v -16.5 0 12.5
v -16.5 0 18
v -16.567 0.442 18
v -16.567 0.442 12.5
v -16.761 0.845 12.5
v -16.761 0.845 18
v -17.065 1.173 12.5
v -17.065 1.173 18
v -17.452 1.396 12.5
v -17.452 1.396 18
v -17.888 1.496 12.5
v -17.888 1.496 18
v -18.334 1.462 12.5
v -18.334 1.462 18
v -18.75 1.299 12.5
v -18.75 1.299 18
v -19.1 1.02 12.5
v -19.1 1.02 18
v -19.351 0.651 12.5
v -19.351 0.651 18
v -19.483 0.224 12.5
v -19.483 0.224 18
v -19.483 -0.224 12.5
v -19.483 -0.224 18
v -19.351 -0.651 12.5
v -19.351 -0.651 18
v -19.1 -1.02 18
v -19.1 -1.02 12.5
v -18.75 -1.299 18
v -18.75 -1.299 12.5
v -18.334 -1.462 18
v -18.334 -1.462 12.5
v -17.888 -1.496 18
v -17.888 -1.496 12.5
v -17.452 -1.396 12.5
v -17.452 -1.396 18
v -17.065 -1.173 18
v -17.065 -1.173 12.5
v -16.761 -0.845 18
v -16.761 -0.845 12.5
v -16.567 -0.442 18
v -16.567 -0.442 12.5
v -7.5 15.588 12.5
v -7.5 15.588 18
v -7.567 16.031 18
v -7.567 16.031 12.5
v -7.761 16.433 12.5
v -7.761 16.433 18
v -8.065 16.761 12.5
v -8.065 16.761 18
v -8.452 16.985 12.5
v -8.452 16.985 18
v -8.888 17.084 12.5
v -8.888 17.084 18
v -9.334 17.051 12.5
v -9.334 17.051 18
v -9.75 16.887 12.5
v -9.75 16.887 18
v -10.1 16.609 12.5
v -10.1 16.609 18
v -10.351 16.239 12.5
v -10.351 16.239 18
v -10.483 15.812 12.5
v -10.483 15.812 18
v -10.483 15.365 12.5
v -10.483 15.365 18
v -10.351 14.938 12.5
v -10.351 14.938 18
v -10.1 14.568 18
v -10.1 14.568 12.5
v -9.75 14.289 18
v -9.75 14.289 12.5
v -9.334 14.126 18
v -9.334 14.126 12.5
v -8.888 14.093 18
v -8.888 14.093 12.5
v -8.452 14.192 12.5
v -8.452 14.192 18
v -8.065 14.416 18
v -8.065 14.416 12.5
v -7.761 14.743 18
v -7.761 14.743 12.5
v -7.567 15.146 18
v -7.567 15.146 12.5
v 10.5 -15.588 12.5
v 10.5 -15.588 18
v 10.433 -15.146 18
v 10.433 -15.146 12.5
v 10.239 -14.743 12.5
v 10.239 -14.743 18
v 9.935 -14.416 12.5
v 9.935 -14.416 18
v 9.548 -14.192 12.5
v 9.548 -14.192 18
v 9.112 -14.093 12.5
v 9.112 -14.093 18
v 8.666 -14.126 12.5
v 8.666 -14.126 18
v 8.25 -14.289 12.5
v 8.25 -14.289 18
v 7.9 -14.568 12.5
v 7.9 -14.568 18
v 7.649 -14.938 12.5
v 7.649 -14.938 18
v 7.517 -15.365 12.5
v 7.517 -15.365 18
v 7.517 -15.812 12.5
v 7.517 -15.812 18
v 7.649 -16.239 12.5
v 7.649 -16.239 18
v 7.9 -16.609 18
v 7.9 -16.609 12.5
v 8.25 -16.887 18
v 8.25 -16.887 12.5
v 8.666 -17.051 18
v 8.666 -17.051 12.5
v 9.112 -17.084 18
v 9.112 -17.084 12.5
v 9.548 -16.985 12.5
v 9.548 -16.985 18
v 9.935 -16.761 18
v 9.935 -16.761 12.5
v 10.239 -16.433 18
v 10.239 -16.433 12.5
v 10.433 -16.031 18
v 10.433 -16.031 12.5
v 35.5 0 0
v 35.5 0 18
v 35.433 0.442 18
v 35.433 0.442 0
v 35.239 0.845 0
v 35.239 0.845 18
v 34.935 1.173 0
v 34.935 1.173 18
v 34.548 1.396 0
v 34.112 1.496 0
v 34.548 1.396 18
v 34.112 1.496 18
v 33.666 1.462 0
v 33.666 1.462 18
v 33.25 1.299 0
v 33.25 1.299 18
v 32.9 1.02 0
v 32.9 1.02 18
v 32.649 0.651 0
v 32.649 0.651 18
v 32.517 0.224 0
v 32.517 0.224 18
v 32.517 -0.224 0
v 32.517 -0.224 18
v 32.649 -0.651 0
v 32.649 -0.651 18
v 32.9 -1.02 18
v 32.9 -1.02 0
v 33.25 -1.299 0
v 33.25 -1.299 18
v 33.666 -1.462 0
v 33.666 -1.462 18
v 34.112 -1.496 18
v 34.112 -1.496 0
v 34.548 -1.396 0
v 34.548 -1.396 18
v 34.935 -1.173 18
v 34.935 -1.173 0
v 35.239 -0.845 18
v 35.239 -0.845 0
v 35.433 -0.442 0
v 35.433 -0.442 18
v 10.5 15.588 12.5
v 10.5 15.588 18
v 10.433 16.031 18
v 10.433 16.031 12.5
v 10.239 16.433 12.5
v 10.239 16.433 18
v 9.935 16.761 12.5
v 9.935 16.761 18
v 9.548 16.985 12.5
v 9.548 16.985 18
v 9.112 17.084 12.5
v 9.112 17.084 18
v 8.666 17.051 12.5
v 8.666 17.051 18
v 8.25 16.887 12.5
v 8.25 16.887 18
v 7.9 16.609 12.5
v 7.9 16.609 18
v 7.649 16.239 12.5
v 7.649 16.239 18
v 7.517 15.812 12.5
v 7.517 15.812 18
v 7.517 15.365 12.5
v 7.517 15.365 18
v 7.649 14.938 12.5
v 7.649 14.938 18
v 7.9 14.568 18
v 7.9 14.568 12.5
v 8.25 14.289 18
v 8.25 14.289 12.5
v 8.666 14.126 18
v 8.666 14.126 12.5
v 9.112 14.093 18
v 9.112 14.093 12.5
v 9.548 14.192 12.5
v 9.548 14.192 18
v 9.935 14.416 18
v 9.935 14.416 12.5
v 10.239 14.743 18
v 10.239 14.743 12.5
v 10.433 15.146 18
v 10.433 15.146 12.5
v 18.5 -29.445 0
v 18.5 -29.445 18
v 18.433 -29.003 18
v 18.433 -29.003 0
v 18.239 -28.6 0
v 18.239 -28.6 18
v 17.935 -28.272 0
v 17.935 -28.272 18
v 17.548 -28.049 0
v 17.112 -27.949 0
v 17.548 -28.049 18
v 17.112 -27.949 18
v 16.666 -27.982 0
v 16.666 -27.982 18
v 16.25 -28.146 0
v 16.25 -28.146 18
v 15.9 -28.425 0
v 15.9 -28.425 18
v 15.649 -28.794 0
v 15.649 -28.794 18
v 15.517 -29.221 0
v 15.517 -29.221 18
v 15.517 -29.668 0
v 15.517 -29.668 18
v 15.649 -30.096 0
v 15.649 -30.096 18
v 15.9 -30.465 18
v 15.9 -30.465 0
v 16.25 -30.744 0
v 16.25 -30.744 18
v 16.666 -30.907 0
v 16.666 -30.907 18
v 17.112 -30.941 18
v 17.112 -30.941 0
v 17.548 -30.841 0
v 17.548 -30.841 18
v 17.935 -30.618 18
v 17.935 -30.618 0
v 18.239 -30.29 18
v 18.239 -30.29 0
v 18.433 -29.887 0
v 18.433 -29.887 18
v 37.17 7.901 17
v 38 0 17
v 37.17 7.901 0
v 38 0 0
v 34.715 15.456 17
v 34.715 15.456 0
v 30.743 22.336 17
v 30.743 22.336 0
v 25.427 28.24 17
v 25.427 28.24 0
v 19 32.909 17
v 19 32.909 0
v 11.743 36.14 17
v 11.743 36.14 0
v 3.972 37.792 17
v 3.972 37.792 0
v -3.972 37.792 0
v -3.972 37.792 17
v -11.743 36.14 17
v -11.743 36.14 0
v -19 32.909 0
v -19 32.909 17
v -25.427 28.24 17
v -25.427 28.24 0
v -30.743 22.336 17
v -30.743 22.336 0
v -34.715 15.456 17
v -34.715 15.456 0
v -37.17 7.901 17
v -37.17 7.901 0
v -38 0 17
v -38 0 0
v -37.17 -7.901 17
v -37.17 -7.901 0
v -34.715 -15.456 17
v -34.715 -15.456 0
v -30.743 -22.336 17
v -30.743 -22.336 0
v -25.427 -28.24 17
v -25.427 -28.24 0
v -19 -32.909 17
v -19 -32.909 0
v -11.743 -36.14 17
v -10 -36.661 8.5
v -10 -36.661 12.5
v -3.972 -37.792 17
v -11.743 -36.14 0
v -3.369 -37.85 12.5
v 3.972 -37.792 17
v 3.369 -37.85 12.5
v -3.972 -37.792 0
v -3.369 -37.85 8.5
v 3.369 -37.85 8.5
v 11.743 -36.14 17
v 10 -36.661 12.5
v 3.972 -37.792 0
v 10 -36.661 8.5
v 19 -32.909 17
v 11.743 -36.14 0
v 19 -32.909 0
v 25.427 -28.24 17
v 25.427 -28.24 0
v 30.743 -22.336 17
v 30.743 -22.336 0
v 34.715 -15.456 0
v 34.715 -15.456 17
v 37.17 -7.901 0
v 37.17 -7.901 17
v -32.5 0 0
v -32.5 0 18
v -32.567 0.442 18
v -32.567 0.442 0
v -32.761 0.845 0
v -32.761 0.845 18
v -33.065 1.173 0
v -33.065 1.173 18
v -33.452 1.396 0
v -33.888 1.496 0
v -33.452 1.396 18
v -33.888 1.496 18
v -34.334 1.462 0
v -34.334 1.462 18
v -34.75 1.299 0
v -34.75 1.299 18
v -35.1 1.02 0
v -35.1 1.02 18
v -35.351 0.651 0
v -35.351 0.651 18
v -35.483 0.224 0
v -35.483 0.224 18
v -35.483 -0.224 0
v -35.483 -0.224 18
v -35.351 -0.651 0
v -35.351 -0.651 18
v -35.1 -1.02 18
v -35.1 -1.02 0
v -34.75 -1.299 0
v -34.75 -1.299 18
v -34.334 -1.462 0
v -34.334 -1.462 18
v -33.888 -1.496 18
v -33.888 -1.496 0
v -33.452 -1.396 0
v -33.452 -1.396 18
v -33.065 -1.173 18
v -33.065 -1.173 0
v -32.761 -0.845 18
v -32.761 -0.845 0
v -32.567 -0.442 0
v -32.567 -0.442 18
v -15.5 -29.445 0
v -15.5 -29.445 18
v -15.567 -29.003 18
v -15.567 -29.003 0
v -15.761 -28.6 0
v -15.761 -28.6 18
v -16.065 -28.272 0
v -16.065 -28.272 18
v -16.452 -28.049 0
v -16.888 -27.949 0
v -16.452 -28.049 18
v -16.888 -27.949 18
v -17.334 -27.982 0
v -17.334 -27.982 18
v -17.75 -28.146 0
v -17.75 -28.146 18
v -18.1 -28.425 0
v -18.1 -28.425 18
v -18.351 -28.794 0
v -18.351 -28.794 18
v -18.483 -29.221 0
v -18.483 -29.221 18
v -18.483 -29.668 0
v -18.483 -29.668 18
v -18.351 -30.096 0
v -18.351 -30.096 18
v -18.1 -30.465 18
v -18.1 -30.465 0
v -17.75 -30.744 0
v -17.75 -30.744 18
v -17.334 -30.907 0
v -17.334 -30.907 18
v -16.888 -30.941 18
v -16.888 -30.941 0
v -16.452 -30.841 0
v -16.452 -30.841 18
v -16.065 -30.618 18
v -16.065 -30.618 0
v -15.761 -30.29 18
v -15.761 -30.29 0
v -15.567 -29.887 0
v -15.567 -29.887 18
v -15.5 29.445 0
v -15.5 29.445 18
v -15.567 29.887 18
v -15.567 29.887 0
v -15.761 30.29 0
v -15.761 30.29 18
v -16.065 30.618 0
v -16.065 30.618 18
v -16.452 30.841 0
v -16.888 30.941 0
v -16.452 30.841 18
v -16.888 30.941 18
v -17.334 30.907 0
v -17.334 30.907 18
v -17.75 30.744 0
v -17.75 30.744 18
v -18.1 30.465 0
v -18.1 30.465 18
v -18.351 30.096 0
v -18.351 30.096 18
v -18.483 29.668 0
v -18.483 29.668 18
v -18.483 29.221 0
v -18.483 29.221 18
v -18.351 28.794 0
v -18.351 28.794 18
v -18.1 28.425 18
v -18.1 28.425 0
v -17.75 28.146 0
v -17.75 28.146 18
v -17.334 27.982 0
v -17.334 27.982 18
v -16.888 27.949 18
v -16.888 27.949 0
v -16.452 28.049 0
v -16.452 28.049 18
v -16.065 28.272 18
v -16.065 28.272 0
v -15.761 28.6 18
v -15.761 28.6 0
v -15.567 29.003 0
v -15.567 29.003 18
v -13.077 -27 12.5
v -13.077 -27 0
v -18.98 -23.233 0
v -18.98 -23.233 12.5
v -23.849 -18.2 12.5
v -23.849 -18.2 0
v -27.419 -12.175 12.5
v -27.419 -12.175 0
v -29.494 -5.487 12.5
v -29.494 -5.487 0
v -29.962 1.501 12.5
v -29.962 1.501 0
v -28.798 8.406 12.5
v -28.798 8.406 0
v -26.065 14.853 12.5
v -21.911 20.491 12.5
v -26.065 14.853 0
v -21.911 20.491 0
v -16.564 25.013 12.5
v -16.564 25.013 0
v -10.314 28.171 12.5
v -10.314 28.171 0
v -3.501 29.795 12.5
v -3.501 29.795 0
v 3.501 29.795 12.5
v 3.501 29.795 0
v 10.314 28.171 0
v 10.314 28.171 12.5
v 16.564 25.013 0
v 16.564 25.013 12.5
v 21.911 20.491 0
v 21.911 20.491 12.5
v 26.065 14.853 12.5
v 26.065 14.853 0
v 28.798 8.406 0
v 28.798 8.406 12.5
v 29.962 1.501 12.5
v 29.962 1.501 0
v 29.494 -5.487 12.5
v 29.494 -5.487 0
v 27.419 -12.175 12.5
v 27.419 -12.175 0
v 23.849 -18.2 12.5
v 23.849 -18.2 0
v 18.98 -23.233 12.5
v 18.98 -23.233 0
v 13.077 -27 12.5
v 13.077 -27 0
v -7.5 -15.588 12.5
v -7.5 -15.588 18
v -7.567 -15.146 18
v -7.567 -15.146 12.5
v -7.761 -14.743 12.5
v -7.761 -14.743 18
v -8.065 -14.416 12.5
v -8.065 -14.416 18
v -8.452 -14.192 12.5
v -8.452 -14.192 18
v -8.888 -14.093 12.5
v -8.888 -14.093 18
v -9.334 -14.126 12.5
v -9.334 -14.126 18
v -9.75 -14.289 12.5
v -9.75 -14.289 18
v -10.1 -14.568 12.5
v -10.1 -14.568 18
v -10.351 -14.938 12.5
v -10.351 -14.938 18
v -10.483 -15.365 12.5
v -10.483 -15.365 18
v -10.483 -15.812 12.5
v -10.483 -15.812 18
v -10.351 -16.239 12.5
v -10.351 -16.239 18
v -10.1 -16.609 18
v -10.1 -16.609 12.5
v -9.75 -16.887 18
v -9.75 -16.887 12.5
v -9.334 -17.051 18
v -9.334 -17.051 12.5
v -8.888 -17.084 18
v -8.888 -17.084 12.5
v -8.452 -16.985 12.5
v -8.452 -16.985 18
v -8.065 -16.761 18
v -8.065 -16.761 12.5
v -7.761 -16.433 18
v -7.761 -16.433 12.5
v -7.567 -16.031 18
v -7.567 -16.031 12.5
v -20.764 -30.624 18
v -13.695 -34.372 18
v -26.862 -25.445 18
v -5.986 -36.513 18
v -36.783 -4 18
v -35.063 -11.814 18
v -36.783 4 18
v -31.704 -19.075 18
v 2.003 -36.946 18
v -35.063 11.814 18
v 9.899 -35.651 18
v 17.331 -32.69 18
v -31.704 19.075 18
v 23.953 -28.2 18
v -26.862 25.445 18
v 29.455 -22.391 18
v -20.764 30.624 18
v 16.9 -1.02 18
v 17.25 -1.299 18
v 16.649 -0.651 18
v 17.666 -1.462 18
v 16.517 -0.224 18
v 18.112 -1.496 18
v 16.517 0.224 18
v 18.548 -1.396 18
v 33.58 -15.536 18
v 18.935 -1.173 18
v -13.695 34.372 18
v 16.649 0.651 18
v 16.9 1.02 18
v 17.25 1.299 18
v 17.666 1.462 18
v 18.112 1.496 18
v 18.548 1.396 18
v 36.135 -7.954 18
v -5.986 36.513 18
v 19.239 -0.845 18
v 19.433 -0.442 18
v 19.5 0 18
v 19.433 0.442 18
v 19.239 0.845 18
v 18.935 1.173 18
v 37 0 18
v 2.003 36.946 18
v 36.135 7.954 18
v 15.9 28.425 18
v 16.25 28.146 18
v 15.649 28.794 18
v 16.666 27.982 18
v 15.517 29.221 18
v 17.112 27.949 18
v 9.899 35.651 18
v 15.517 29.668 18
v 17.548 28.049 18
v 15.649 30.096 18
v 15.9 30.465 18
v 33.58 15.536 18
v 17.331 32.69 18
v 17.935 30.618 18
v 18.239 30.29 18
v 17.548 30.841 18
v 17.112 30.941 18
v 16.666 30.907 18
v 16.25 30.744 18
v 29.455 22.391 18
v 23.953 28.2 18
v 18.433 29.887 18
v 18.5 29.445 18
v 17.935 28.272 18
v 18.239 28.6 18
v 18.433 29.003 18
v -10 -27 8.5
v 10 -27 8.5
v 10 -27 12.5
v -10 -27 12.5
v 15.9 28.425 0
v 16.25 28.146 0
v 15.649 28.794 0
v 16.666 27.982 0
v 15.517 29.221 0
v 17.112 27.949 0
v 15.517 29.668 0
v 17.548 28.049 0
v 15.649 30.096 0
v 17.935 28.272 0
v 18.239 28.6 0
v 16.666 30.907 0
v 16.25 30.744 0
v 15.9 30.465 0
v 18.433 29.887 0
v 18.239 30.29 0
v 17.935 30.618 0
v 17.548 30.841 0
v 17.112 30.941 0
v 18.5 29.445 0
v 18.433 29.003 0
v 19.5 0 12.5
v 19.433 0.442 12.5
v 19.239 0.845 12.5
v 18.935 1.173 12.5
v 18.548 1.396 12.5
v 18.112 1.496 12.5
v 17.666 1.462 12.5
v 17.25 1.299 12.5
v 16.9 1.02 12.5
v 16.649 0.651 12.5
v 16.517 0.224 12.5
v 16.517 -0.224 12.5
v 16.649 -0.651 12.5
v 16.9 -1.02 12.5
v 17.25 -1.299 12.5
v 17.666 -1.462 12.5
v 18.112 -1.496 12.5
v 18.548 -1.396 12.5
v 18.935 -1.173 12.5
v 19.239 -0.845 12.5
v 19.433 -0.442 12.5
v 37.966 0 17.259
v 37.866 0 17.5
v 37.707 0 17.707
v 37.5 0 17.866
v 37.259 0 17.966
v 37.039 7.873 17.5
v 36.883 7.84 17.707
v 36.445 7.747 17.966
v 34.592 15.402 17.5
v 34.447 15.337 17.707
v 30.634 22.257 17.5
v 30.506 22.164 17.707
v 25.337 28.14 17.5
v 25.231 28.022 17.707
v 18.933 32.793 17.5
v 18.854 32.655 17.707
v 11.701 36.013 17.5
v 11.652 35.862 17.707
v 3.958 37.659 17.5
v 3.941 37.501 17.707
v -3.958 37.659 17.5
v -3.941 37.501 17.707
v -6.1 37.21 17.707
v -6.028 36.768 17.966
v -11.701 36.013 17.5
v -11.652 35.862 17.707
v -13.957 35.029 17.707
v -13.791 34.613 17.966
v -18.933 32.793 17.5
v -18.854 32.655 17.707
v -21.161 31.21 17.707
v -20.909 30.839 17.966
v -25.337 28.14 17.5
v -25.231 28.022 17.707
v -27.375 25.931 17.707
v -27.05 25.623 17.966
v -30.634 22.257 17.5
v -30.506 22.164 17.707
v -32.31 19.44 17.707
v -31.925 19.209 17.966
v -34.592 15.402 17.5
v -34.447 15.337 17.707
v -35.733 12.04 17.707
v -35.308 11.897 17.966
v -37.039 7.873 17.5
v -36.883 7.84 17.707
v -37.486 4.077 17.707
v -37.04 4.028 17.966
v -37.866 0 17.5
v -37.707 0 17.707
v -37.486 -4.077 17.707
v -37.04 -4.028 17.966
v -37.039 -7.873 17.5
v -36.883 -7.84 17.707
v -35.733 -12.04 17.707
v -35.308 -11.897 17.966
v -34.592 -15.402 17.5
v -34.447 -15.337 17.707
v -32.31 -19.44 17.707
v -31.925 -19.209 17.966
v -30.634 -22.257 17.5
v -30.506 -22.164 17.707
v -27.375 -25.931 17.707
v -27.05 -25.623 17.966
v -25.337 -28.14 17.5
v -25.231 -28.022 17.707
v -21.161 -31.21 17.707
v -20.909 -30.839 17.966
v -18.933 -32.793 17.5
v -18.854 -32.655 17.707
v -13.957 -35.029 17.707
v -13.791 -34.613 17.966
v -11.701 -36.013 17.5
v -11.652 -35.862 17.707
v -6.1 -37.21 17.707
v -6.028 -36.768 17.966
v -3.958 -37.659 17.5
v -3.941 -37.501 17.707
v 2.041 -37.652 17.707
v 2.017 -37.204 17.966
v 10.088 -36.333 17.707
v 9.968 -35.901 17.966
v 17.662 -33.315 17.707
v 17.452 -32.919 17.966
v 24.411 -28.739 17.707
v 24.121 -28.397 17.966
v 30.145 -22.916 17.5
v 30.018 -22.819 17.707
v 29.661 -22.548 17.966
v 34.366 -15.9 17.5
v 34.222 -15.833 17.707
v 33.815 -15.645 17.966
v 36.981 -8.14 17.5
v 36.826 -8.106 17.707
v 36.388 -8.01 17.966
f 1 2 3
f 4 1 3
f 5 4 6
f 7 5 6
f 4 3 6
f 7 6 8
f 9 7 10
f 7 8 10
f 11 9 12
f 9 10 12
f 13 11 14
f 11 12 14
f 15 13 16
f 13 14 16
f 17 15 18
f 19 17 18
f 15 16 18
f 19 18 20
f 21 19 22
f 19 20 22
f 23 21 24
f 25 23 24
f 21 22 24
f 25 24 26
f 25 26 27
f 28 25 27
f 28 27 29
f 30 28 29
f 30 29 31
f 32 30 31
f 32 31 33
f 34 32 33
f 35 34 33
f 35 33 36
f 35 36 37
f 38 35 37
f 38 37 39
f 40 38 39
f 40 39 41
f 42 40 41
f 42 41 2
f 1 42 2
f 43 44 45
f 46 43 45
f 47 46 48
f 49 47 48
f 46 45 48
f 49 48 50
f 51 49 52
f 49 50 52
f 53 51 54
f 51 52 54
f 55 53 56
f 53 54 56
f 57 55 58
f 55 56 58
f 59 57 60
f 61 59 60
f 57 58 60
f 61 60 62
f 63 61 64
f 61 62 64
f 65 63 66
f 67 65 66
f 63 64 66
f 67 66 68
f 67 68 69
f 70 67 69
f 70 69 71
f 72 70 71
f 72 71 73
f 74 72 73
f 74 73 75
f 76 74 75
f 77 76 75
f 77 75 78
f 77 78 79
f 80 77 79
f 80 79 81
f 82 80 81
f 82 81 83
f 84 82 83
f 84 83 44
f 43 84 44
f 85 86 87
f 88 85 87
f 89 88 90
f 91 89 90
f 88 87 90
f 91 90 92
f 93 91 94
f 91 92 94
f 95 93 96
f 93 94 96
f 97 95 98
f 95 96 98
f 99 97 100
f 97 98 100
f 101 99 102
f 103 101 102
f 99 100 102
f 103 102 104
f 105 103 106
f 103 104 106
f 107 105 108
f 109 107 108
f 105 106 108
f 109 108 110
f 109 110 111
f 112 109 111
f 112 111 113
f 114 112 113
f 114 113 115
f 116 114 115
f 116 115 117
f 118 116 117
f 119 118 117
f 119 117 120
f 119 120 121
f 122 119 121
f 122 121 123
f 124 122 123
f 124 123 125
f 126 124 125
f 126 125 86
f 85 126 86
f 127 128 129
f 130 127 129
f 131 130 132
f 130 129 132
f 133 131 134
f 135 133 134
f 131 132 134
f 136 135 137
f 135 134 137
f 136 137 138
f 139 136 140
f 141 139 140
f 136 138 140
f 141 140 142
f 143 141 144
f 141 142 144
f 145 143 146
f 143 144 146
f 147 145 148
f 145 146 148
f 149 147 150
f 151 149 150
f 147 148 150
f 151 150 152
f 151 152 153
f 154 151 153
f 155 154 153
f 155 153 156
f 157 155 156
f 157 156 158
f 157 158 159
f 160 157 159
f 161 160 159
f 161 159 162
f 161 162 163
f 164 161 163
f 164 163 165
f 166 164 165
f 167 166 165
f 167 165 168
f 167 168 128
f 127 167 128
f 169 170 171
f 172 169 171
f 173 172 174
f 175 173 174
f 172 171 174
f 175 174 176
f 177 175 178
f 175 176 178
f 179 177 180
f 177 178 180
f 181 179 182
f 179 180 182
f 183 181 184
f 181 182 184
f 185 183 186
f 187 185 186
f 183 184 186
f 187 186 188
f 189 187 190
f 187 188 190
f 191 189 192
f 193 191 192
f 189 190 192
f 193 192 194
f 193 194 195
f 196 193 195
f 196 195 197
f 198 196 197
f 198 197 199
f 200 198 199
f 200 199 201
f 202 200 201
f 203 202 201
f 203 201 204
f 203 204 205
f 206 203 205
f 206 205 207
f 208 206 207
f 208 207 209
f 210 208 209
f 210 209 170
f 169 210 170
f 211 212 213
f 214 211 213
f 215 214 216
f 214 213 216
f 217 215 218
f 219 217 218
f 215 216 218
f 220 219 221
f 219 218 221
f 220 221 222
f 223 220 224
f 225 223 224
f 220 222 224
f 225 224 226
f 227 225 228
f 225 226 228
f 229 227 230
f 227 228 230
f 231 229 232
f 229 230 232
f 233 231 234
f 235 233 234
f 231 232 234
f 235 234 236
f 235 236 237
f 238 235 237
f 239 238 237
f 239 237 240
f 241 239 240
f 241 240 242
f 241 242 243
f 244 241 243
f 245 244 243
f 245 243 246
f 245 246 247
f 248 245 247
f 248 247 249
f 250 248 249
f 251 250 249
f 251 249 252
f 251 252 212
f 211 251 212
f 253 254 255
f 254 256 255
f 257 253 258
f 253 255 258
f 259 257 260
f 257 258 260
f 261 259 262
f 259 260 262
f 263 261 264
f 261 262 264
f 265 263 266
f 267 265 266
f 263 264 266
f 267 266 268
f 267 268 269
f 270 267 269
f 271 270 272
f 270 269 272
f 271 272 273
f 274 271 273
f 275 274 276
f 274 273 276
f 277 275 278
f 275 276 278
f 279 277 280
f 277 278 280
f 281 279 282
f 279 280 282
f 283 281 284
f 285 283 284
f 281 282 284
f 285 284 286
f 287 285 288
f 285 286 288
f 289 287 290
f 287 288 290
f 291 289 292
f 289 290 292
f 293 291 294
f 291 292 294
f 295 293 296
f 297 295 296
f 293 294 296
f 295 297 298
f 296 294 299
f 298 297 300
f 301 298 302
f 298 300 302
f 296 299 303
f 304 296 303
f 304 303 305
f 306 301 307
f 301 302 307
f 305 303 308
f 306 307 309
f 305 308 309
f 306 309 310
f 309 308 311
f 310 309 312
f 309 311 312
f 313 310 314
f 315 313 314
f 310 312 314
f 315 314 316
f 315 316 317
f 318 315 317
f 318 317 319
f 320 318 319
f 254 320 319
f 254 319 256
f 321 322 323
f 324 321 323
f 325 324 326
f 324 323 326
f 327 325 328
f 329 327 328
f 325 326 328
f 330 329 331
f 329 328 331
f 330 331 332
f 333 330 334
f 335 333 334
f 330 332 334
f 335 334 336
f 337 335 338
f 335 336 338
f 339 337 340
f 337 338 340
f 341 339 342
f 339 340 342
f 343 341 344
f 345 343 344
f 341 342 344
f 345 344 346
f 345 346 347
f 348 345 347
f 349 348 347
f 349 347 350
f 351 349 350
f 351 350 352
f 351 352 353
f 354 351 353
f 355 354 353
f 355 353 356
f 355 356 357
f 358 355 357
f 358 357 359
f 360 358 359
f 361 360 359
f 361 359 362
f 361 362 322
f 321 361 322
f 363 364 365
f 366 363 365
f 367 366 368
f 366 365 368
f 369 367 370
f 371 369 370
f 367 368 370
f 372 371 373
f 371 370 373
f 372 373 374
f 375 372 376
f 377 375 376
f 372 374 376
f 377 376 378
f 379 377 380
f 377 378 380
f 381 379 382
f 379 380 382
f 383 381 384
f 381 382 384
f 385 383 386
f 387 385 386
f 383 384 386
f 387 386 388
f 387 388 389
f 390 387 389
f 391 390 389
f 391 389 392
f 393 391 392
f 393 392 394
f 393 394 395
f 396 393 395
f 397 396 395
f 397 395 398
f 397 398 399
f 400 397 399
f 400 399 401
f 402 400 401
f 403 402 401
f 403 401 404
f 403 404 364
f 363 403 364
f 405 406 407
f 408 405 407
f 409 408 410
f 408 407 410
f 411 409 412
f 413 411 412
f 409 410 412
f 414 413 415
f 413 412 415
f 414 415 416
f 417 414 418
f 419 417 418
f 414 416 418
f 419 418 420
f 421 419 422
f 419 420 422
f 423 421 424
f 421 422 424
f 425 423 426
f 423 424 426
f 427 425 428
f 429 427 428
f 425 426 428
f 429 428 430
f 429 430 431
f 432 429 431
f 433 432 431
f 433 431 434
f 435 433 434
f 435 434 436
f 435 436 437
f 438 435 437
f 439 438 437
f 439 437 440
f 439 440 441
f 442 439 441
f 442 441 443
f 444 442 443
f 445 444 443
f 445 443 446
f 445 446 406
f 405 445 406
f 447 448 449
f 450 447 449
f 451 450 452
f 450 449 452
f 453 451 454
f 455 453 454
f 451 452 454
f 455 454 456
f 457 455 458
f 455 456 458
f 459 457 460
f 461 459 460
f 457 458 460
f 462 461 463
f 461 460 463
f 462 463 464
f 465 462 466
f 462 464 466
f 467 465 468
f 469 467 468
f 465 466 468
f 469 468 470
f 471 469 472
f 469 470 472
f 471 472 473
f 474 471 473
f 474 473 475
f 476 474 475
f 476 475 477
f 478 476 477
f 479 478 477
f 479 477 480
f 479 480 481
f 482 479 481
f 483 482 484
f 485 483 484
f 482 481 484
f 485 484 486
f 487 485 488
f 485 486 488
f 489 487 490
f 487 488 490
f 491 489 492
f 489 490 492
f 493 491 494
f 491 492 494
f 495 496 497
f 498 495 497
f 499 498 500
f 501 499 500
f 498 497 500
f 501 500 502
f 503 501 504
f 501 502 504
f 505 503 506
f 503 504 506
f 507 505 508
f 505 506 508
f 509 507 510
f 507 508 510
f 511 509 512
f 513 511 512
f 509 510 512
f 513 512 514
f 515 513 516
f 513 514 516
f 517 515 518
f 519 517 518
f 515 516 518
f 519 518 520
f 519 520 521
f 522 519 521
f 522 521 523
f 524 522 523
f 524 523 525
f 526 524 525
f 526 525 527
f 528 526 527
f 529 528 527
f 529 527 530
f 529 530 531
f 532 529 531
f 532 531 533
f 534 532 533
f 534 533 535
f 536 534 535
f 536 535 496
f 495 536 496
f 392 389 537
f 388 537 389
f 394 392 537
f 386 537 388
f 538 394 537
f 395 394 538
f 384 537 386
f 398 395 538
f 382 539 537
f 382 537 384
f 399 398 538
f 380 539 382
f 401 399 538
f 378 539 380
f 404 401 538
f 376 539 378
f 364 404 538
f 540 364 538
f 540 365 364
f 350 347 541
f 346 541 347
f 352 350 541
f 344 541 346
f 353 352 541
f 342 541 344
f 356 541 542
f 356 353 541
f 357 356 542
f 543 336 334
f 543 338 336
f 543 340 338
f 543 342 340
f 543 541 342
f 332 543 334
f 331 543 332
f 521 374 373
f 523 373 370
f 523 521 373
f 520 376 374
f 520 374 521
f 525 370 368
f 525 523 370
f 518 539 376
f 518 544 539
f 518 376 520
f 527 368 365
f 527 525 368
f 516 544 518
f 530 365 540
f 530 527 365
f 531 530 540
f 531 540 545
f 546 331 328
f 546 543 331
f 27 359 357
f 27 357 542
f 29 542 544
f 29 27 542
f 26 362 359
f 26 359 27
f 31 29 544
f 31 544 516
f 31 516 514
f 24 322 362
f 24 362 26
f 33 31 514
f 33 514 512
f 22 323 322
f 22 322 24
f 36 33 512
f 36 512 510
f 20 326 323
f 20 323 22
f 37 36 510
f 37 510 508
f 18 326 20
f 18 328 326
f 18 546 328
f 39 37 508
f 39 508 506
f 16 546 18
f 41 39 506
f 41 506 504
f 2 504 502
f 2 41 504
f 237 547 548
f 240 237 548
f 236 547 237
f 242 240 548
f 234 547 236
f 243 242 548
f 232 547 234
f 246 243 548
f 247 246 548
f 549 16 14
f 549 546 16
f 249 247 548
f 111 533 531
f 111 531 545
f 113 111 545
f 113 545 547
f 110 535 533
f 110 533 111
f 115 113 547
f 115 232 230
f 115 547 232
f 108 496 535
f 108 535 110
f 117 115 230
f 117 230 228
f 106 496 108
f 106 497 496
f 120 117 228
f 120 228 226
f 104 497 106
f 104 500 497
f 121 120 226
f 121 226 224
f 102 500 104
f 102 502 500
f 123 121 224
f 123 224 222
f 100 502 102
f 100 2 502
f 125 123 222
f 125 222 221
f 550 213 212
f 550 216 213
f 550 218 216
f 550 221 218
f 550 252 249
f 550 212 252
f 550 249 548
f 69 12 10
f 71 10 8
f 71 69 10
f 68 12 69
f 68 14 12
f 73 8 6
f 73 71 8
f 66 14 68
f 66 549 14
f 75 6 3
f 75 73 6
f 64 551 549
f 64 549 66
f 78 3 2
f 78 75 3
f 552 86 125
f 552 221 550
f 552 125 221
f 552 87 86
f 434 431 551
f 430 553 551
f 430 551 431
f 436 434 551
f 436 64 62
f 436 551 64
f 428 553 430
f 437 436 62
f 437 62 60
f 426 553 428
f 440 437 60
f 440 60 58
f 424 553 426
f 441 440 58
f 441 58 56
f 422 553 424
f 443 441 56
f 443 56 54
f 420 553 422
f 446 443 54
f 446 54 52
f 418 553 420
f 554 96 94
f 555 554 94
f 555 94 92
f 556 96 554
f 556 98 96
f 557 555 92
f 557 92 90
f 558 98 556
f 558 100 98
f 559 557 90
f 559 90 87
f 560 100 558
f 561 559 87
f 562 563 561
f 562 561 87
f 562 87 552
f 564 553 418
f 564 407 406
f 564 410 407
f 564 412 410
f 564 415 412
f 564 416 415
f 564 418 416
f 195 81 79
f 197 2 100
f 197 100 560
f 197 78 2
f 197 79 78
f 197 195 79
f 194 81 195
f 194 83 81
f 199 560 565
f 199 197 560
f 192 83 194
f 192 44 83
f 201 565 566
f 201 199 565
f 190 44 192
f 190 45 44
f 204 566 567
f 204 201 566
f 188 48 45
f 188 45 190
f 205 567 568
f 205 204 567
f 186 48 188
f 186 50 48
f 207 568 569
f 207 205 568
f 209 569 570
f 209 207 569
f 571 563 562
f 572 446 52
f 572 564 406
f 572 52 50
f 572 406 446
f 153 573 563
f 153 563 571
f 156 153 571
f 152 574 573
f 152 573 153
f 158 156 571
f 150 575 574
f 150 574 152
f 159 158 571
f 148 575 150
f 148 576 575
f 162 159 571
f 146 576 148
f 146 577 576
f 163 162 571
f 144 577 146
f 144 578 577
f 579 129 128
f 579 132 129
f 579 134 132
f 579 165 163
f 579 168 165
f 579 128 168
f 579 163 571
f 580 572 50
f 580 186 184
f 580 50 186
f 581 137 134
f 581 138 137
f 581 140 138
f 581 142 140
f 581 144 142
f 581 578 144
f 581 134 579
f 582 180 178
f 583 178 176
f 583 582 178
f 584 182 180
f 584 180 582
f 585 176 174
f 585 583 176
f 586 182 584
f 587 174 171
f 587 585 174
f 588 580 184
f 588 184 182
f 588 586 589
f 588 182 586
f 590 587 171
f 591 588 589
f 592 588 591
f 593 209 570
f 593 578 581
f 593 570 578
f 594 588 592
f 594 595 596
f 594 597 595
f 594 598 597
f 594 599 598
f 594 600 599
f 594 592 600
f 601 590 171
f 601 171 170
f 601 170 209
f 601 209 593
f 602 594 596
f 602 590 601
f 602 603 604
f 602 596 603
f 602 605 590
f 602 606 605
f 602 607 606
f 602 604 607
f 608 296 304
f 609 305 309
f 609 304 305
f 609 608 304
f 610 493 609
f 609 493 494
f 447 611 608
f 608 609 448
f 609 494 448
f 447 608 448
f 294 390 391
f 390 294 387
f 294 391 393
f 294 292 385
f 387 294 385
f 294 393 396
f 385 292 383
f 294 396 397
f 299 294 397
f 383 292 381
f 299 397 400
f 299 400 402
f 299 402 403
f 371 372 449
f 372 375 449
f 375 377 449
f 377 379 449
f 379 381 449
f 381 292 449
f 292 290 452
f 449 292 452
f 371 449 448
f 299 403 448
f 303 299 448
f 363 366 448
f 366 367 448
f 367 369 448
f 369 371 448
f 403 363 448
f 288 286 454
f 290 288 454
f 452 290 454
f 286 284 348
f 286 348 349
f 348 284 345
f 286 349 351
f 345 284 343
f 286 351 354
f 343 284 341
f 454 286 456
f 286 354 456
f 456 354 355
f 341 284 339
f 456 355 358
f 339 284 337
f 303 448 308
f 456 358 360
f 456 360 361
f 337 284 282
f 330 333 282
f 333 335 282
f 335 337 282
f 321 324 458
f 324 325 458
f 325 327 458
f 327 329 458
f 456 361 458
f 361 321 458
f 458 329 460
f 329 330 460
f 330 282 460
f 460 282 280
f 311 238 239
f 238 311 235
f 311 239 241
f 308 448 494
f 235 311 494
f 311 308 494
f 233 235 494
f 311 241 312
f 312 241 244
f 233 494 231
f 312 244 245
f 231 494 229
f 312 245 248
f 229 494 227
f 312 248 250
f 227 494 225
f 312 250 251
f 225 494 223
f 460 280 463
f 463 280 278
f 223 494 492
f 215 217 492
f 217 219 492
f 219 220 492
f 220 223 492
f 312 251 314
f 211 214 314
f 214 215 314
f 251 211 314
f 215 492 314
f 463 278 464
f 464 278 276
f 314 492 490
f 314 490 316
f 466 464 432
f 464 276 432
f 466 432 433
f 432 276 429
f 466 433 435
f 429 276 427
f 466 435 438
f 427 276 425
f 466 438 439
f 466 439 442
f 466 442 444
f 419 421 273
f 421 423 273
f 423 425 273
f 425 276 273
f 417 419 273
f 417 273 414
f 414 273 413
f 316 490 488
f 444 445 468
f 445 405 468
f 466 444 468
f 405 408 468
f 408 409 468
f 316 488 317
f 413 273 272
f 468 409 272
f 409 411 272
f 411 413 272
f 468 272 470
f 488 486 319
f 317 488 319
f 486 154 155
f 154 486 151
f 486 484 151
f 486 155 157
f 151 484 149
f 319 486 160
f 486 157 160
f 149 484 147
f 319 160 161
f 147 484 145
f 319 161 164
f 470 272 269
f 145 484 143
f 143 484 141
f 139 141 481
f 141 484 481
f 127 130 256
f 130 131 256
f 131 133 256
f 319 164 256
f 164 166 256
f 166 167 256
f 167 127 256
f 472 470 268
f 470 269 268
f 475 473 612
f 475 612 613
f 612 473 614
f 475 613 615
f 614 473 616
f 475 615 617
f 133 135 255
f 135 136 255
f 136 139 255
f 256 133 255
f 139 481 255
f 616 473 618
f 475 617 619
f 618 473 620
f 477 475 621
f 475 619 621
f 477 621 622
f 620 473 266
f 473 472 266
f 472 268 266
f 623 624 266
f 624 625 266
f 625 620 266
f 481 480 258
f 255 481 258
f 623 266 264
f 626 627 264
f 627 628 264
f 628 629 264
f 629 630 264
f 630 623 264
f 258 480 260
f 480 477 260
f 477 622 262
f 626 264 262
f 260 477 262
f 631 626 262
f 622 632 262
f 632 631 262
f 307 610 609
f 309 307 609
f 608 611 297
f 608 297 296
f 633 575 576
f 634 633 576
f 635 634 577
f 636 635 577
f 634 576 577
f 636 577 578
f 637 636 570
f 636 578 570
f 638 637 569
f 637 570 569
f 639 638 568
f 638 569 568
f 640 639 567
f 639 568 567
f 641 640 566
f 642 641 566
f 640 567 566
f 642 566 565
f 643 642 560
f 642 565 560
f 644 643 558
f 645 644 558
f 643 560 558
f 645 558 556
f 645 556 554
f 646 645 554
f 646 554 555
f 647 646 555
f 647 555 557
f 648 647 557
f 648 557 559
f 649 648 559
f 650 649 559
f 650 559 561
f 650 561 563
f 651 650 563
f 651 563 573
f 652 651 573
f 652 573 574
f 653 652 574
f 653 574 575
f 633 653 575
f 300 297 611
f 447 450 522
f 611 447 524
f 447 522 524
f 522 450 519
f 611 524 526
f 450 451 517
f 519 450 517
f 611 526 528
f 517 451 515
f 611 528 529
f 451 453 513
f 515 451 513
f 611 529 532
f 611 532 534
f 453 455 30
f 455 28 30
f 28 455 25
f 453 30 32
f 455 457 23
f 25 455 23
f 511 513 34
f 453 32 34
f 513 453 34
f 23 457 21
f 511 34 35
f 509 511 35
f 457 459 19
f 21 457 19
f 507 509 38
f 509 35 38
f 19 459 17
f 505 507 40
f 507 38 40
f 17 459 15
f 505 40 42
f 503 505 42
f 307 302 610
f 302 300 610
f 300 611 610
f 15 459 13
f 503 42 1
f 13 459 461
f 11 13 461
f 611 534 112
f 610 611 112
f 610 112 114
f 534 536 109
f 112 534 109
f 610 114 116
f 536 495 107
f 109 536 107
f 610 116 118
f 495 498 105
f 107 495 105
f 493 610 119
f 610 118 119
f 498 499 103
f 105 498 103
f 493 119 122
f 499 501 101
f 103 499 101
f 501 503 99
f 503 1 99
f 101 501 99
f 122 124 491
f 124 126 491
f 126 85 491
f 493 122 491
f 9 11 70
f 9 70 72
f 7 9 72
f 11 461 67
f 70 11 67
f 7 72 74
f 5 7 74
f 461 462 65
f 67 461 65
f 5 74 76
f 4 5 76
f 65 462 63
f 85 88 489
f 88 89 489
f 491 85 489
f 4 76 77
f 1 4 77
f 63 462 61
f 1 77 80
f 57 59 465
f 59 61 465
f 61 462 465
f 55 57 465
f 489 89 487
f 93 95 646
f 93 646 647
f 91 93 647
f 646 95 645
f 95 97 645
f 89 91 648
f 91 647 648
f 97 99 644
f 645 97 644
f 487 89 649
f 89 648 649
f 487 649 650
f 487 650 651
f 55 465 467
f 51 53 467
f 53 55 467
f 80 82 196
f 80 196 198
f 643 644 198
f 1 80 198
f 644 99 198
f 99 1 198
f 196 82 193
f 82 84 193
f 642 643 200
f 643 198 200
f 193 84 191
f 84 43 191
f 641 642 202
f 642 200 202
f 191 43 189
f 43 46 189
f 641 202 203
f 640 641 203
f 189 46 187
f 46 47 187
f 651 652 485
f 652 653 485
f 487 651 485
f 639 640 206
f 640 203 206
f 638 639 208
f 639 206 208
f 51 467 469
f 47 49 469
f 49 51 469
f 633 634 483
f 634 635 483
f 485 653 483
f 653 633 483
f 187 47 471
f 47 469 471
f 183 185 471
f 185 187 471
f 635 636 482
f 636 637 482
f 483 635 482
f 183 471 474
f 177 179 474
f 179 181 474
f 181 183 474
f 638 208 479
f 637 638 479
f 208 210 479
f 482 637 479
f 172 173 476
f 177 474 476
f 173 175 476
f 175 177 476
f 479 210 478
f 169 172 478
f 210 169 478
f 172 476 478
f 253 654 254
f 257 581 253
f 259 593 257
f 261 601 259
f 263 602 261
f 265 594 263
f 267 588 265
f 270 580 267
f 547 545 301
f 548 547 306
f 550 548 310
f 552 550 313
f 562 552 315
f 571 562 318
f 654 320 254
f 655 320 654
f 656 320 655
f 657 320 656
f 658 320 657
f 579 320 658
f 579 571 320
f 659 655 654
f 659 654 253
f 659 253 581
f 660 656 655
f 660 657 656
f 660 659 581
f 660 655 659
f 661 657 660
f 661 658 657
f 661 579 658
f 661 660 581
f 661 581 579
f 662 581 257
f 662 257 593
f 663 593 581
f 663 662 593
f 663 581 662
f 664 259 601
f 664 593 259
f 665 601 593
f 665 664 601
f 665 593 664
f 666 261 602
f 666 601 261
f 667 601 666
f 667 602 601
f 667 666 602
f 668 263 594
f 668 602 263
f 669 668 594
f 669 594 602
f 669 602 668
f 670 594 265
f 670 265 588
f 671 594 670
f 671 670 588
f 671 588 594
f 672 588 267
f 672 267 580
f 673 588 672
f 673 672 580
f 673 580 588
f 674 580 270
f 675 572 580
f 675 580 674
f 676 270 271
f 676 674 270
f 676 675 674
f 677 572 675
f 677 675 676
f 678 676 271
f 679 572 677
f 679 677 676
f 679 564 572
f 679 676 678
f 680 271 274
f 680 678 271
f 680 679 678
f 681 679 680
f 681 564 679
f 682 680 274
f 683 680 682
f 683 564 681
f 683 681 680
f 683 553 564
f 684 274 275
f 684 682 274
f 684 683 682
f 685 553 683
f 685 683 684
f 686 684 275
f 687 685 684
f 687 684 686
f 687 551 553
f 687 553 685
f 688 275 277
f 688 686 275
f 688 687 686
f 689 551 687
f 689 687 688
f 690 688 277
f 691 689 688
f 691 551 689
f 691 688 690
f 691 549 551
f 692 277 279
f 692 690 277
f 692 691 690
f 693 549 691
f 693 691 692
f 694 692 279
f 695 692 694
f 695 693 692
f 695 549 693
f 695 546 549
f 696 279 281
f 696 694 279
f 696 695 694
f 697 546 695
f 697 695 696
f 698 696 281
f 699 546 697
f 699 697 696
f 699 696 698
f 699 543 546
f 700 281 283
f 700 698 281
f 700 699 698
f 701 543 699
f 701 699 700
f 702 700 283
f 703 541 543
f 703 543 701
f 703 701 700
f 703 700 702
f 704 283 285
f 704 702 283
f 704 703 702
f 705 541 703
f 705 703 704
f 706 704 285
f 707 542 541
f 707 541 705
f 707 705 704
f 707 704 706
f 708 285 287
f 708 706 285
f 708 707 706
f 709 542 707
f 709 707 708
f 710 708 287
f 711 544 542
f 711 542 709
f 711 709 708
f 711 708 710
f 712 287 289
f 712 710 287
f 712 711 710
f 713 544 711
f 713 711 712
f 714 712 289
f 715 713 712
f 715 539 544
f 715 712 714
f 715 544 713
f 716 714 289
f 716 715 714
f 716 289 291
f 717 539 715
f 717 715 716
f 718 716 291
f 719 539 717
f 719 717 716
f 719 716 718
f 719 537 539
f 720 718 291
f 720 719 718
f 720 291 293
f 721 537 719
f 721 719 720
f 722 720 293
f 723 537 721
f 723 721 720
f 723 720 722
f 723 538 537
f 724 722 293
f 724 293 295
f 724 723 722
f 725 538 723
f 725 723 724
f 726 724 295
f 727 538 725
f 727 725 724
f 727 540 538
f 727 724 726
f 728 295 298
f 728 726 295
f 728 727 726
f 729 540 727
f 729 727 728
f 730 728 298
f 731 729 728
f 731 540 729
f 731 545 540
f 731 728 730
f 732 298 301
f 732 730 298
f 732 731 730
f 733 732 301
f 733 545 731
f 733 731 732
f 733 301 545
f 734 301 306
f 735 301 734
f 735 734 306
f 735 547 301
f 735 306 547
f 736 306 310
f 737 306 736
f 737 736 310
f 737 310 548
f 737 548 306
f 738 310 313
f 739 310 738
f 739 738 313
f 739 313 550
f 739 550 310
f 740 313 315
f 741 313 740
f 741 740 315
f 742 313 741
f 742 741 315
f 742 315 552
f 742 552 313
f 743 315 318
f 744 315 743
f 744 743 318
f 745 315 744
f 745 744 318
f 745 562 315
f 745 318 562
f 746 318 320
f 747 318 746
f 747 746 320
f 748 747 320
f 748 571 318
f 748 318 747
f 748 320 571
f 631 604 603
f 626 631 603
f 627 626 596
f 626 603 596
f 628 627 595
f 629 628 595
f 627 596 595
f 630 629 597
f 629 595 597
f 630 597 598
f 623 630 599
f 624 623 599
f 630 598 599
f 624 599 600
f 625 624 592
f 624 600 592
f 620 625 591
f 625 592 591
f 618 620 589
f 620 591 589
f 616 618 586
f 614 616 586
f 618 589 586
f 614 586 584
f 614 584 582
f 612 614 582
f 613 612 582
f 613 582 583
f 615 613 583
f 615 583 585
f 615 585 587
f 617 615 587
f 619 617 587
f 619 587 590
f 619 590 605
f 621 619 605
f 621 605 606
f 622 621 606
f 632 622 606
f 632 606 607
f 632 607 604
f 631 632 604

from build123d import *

# Parameters (mm, degrees)
SKETCH_1_R               = 38
EXTRUDE_1_DEPTH          = 18
CUT_EXTRUDE_1_REACH      = 58.675
SKETCH_2_R               = 1.5
CUT_EXTRUDE_2_DEPTH      = 12.5
FILLET_1_R               = 1
CUT_EXTRUDE_7_REACH      = 79.414
CUT_EXTRUDE_7_END_RADIUS = 38
SKETCH_6_W               = 20
SKETCH_6_H               = 4
CUT_EXTRUDE_8_REACH      = 58.675
SKETCH_7_R               = 1.5


with BuildPart() as part:
    # Эскиз1 → Бобышка-Вытянуть1 (new body)
    with BuildSketch(Plane.XY):
        Circle(SKETCH_1_R)
    extrude(amount=EXTRUDE_1_DEPTH)

    # Эскиз2 → Вырез-Вытянуть1 (cut, up to next)
    with BuildSketch(Plane.XY.offset(18), mode=Mode.PRIVATE) as cut_extrude_1_sk1:
        with Locations((-34, 0)):
            Circle(SKETCH_2_R)
    cut_extrude_1_tool1 = extrude(cut_extrude_1_sk1.sketch, amount=-CUT_EXTRUDE_1_REACH, mode=Mode.PRIVATE) & part.part
    # Эскиз2 → Вырез-Вытянуть1 (cut, up to next)
    with BuildSketch(Plane.XY.offset(18), mode=Mode.PRIVATE) as cut_extrude_1_sk2:
        with Locations((-17, 29.444863729)):
            Circle(SKETCH_2_R)
    cut_extrude_1_tool2 = extrude(cut_extrude_1_sk2.sketch, amount=-CUT_EXTRUDE_1_REACH, mode=Mode.PRIVATE) & part.part
    # Эскиз2 → Вырез-Вытянуть1 (cut, up to next)
    with BuildSketch(Plane.XY.offset(18), mode=Mode.PRIVATE) as cut_extrude_1_sk3:
        with Locations((17, 29.444863729)):
            Circle(SKETCH_2_R)
    cut_extrude_1_tool3 = extrude(cut_extrude_1_sk3.sketch, amount=-CUT_EXTRUDE_1_REACH, mode=Mode.PRIVATE) & part.part
    # Эскиз2 → Вырез-Вытянуть1 (cut, up to next)
    with BuildSketch(Plane.XY.offset(18), mode=Mode.PRIVATE) as cut_extrude_1_sk4:
        with Locations((34, 0)):
            Circle(SKETCH_2_R)
    cut_extrude_1_tool4 = extrude(cut_extrude_1_sk4.sketch, amount=-CUT_EXTRUDE_1_REACH, mode=Mode.PRIVATE) & part.part
    # Эскиз2 → Вырез-Вытянуть1 (cut, up to next)
    with BuildSketch(Plane.XY.offset(18), mode=Mode.PRIVATE) as cut_extrude_1_sk5:
        with Locations((17, -29.444863729)):
            Circle(SKETCH_2_R)
    cut_extrude_1_tool5 = extrude(cut_extrude_1_sk5.sketch, amount=-CUT_EXTRUDE_1_REACH, mode=Mode.PRIVATE) & part.part
    # Эскиз2 → Вырез-Вытянуть1 (cut, up to next)
    with BuildSketch(Plane.XY.offset(18), mode=Mode.PRIVATE) as cut_extrude_1_sk6:
        with Locations((-17, -29.444863729)):
            Circle(SKETCH_2_R)
    cut_extrude_1_tool6 = extrude(cut_extrude_1_sk6.sketch, amount=-CUT_EXTRUDE_1_REACH, mode=Mode.PRIVATE) & part.part
    add(cut_extrude_1_tool1.solids().sort_by_distance((-34, 0, 18))[0], mode=Mode.SUBTRACT)
    add(cut_extrude_1_tool2.solids().sort_by_distance((-17, 29.444864, 18))[0], mode=Mode.SUBTRACT)
    add(cut_extrude_1_tool3.solids().sort_by_distance((17, 29.444864, 18))[0], mode=Mode.SUBTRACT)
    add(cut_extrude_1_tool4.solids().sort_by_distance((34, 0, 18))[0], mode=Mode.SUBTRACT)
    add(cut_extrude_1_tool5.solids().sort_by_distance((17, -29.444864, 18))[0], mode=Mode.SUBTRACT)
    add(cut_extrude_1_tool6.solids().sort_by_distance((-17, -29.444864, 18))[0], mode=Mode.SUBTRACT)

    # Эскиз3 → Вырез-Вытянуть2 (cut)
    with BuildSketch(Plane(origin=(0, 0, 0), x_dir=(-1, 0, 0), z_dir=(0, 0, -1))):
        with BuildLine():
            Line((-13.076696831, -27), (13.076696831, -27))
            ThreePointArc((13.076696831, -27), (0, 30), (-13.076696831, -27))
        make_face()
    extrude(amount=-CUT_EXTRUDE_2_DEPTH, mode=Mode.SUBTRACT)

    # Скругление1
    fillet_1_edges = [part.edges().sort_by_distance(p)[0] for p in [
        (-38, 0, 18),
    ]]
    fillet(fillet_1_edges, radius=FILLET_1_R)

    # Вырез-Вытянуть7: up to this cylinder (the profile starts inside it)
    cut_extrude_7_end = Plane(origin=(0, 0, 10.5), z_dir=(0, 0, -1)) * Cylinder(CUT_EXTRUDE_7_END_RADIUS, 235.828, mode=Mode.PRIVATE)
    # Эскиз6 → Вырез-Вытянуть7 (cut, up to the surface)
    with BuildSketch(Plane(origin=(0, -27, 0), x_dir=(1, 0, 0), z_dir=(0, 1, 0)), mode=Mode.PRIVATE) as cut_extrude_7_sk1:
        with Locations((0, -10.5)):
            Rectangle(SKETCH_6_W, SKETCH_6_H)
    cut_extrude_7_tool1 = extrude(cut_extrude_7_sk1.sketch, amount=-CUT_EXTRUDE_7_REACH, mode=Mode.PRIVATE) & cut_extrude_7_end
    add(cut_extrude_7_tool1.solids().sort_by_distance((0, -27, 10.5))[0], mode=Mode.SUBTRACT)

    # Эскиз7 → Вырез-Вытянуть8 (cut, up to next)
    with BuildSketch(Plane.XY.offset(18), mode=Mode.PRIVATE) as cut_extrude_8_sk1:
        with Locations((-18, 0)):
            Circle(SKETCH_7_R)
    cut_extrude_8_tool1 = extrude(cut_extrude_8_sk1.sketch, amount=-CUT_EXTRUDE_8_REACH, mode=Mode.PRIVATE) & part.part
    # Эскиз7 → Вырез-Вытянуть8 (cut, up to next)
    with BuildSketch(Plane.XY.offset(18), mode=Mode.PRIVATE) as cut_extrude_8_sk2:
        with Locations((-9, 15.588457268)):
            Circle(SKETCH_7_R)
    cut_extrude_8_tool2 = extrude(cut_extrude_8_sk2.sketch, amount=-CUT_EXTRUDE_8_REACH, mode=Mode.PRIVATE) & part.part
    # Эскиз7 → Вырез-Вытянуть8 (cut, up to next)
    with BuildSketch(Plane.XY.offset(18), mode=Mode.PRIVATE) as cut_extrude_8_sk3:
        with Locations((9, 15.588457268)):
            Circle(SKETCH_7_R)
    cut_extrude_8_tool3 = extrude(cut_extrude_8_sk3.sketch, amount=-CUT_EXTRUDE_8_REACH, mode=Mode.PRIVATE) & part.part
    # Эскиз7 → Вырез-Вытянуть8 (cut, up to next)
    with BuildSketch(Plane.XY.offset(18), mode=Mode.PRIVATE) as cut_extrude_8_sk4:
        with Locations((18, 0)):
            Circle(SKETCH_7_R)
    cut_extrude_8_tool4 = extrude(cut_extrude_8_sk4.sketch, amount=-CUT_EXTRUDE_8_REACH, mode=Mode.PRIVATE) & part.part
    # Эскиз7 → Вырез-Вытянуть8 (cut, up to next)
    with BuildSketch(Plane.XY.offset(18), mode=Mode.PRIVATE) as cut_extrude_8_sk5:
        with Locations((9, -15.588457268)):
            Circle(SKETCH_7_R)
    cut_extrude_8_tool5 = extrude(cut_extrude_8_sk5.sketch, amount=-CUT_EXTRUDE_8_REACH, mode=Mode.PRIVATE) & part.part
    # Эскиз7 → Вырез-Вытянуть8 (cut, up to next)
    with BuildSketch(Plane.XY.offset(18), mode=Mode.PRIVATE) as cut_extrude_8_sk6:
        with Locations((-9, -15.588457268)):
            Circle(SKETCH_7_R)
    cut_extrude_8_tool6 = extrude(cut_extrude_8_sk6.sketch, amount=-CUT_EXTRUDE_8_REACH, mode=Mode.PRIVATE) & part.part
    add(cut_extrude_8_tool1.solids().sort_by_distance((-18, 0, 18))[0], mode=Mode.SUBTRACT)
    add(cut_extrude_8_tool2.solids().sort_by_distance((-9, 15.588457, 18))[0], mode=Mode.SUBTRACT)
    add(cut_extrude_8_tool3.solids().sort_by_distance((9, 15.588457, 18))[0], mode=Mode.SUBTRACT)
    add(cut_extrude_8_tool4.solids().sort_by_distance((18, 0, 18))[0], mode=Mode.SUBTRACT)
    add(cut_extrude_8_tool5.solids().sort_by_distance((9, -15.588457, 18))[0], mode=Mode.SUBTRACT)
    add(cut_extrude_8_tool6.solids().sort_by_distance((-9, -15.588457, 18))[0], mode=Mode.SUBTRACT)


solid = part.part
